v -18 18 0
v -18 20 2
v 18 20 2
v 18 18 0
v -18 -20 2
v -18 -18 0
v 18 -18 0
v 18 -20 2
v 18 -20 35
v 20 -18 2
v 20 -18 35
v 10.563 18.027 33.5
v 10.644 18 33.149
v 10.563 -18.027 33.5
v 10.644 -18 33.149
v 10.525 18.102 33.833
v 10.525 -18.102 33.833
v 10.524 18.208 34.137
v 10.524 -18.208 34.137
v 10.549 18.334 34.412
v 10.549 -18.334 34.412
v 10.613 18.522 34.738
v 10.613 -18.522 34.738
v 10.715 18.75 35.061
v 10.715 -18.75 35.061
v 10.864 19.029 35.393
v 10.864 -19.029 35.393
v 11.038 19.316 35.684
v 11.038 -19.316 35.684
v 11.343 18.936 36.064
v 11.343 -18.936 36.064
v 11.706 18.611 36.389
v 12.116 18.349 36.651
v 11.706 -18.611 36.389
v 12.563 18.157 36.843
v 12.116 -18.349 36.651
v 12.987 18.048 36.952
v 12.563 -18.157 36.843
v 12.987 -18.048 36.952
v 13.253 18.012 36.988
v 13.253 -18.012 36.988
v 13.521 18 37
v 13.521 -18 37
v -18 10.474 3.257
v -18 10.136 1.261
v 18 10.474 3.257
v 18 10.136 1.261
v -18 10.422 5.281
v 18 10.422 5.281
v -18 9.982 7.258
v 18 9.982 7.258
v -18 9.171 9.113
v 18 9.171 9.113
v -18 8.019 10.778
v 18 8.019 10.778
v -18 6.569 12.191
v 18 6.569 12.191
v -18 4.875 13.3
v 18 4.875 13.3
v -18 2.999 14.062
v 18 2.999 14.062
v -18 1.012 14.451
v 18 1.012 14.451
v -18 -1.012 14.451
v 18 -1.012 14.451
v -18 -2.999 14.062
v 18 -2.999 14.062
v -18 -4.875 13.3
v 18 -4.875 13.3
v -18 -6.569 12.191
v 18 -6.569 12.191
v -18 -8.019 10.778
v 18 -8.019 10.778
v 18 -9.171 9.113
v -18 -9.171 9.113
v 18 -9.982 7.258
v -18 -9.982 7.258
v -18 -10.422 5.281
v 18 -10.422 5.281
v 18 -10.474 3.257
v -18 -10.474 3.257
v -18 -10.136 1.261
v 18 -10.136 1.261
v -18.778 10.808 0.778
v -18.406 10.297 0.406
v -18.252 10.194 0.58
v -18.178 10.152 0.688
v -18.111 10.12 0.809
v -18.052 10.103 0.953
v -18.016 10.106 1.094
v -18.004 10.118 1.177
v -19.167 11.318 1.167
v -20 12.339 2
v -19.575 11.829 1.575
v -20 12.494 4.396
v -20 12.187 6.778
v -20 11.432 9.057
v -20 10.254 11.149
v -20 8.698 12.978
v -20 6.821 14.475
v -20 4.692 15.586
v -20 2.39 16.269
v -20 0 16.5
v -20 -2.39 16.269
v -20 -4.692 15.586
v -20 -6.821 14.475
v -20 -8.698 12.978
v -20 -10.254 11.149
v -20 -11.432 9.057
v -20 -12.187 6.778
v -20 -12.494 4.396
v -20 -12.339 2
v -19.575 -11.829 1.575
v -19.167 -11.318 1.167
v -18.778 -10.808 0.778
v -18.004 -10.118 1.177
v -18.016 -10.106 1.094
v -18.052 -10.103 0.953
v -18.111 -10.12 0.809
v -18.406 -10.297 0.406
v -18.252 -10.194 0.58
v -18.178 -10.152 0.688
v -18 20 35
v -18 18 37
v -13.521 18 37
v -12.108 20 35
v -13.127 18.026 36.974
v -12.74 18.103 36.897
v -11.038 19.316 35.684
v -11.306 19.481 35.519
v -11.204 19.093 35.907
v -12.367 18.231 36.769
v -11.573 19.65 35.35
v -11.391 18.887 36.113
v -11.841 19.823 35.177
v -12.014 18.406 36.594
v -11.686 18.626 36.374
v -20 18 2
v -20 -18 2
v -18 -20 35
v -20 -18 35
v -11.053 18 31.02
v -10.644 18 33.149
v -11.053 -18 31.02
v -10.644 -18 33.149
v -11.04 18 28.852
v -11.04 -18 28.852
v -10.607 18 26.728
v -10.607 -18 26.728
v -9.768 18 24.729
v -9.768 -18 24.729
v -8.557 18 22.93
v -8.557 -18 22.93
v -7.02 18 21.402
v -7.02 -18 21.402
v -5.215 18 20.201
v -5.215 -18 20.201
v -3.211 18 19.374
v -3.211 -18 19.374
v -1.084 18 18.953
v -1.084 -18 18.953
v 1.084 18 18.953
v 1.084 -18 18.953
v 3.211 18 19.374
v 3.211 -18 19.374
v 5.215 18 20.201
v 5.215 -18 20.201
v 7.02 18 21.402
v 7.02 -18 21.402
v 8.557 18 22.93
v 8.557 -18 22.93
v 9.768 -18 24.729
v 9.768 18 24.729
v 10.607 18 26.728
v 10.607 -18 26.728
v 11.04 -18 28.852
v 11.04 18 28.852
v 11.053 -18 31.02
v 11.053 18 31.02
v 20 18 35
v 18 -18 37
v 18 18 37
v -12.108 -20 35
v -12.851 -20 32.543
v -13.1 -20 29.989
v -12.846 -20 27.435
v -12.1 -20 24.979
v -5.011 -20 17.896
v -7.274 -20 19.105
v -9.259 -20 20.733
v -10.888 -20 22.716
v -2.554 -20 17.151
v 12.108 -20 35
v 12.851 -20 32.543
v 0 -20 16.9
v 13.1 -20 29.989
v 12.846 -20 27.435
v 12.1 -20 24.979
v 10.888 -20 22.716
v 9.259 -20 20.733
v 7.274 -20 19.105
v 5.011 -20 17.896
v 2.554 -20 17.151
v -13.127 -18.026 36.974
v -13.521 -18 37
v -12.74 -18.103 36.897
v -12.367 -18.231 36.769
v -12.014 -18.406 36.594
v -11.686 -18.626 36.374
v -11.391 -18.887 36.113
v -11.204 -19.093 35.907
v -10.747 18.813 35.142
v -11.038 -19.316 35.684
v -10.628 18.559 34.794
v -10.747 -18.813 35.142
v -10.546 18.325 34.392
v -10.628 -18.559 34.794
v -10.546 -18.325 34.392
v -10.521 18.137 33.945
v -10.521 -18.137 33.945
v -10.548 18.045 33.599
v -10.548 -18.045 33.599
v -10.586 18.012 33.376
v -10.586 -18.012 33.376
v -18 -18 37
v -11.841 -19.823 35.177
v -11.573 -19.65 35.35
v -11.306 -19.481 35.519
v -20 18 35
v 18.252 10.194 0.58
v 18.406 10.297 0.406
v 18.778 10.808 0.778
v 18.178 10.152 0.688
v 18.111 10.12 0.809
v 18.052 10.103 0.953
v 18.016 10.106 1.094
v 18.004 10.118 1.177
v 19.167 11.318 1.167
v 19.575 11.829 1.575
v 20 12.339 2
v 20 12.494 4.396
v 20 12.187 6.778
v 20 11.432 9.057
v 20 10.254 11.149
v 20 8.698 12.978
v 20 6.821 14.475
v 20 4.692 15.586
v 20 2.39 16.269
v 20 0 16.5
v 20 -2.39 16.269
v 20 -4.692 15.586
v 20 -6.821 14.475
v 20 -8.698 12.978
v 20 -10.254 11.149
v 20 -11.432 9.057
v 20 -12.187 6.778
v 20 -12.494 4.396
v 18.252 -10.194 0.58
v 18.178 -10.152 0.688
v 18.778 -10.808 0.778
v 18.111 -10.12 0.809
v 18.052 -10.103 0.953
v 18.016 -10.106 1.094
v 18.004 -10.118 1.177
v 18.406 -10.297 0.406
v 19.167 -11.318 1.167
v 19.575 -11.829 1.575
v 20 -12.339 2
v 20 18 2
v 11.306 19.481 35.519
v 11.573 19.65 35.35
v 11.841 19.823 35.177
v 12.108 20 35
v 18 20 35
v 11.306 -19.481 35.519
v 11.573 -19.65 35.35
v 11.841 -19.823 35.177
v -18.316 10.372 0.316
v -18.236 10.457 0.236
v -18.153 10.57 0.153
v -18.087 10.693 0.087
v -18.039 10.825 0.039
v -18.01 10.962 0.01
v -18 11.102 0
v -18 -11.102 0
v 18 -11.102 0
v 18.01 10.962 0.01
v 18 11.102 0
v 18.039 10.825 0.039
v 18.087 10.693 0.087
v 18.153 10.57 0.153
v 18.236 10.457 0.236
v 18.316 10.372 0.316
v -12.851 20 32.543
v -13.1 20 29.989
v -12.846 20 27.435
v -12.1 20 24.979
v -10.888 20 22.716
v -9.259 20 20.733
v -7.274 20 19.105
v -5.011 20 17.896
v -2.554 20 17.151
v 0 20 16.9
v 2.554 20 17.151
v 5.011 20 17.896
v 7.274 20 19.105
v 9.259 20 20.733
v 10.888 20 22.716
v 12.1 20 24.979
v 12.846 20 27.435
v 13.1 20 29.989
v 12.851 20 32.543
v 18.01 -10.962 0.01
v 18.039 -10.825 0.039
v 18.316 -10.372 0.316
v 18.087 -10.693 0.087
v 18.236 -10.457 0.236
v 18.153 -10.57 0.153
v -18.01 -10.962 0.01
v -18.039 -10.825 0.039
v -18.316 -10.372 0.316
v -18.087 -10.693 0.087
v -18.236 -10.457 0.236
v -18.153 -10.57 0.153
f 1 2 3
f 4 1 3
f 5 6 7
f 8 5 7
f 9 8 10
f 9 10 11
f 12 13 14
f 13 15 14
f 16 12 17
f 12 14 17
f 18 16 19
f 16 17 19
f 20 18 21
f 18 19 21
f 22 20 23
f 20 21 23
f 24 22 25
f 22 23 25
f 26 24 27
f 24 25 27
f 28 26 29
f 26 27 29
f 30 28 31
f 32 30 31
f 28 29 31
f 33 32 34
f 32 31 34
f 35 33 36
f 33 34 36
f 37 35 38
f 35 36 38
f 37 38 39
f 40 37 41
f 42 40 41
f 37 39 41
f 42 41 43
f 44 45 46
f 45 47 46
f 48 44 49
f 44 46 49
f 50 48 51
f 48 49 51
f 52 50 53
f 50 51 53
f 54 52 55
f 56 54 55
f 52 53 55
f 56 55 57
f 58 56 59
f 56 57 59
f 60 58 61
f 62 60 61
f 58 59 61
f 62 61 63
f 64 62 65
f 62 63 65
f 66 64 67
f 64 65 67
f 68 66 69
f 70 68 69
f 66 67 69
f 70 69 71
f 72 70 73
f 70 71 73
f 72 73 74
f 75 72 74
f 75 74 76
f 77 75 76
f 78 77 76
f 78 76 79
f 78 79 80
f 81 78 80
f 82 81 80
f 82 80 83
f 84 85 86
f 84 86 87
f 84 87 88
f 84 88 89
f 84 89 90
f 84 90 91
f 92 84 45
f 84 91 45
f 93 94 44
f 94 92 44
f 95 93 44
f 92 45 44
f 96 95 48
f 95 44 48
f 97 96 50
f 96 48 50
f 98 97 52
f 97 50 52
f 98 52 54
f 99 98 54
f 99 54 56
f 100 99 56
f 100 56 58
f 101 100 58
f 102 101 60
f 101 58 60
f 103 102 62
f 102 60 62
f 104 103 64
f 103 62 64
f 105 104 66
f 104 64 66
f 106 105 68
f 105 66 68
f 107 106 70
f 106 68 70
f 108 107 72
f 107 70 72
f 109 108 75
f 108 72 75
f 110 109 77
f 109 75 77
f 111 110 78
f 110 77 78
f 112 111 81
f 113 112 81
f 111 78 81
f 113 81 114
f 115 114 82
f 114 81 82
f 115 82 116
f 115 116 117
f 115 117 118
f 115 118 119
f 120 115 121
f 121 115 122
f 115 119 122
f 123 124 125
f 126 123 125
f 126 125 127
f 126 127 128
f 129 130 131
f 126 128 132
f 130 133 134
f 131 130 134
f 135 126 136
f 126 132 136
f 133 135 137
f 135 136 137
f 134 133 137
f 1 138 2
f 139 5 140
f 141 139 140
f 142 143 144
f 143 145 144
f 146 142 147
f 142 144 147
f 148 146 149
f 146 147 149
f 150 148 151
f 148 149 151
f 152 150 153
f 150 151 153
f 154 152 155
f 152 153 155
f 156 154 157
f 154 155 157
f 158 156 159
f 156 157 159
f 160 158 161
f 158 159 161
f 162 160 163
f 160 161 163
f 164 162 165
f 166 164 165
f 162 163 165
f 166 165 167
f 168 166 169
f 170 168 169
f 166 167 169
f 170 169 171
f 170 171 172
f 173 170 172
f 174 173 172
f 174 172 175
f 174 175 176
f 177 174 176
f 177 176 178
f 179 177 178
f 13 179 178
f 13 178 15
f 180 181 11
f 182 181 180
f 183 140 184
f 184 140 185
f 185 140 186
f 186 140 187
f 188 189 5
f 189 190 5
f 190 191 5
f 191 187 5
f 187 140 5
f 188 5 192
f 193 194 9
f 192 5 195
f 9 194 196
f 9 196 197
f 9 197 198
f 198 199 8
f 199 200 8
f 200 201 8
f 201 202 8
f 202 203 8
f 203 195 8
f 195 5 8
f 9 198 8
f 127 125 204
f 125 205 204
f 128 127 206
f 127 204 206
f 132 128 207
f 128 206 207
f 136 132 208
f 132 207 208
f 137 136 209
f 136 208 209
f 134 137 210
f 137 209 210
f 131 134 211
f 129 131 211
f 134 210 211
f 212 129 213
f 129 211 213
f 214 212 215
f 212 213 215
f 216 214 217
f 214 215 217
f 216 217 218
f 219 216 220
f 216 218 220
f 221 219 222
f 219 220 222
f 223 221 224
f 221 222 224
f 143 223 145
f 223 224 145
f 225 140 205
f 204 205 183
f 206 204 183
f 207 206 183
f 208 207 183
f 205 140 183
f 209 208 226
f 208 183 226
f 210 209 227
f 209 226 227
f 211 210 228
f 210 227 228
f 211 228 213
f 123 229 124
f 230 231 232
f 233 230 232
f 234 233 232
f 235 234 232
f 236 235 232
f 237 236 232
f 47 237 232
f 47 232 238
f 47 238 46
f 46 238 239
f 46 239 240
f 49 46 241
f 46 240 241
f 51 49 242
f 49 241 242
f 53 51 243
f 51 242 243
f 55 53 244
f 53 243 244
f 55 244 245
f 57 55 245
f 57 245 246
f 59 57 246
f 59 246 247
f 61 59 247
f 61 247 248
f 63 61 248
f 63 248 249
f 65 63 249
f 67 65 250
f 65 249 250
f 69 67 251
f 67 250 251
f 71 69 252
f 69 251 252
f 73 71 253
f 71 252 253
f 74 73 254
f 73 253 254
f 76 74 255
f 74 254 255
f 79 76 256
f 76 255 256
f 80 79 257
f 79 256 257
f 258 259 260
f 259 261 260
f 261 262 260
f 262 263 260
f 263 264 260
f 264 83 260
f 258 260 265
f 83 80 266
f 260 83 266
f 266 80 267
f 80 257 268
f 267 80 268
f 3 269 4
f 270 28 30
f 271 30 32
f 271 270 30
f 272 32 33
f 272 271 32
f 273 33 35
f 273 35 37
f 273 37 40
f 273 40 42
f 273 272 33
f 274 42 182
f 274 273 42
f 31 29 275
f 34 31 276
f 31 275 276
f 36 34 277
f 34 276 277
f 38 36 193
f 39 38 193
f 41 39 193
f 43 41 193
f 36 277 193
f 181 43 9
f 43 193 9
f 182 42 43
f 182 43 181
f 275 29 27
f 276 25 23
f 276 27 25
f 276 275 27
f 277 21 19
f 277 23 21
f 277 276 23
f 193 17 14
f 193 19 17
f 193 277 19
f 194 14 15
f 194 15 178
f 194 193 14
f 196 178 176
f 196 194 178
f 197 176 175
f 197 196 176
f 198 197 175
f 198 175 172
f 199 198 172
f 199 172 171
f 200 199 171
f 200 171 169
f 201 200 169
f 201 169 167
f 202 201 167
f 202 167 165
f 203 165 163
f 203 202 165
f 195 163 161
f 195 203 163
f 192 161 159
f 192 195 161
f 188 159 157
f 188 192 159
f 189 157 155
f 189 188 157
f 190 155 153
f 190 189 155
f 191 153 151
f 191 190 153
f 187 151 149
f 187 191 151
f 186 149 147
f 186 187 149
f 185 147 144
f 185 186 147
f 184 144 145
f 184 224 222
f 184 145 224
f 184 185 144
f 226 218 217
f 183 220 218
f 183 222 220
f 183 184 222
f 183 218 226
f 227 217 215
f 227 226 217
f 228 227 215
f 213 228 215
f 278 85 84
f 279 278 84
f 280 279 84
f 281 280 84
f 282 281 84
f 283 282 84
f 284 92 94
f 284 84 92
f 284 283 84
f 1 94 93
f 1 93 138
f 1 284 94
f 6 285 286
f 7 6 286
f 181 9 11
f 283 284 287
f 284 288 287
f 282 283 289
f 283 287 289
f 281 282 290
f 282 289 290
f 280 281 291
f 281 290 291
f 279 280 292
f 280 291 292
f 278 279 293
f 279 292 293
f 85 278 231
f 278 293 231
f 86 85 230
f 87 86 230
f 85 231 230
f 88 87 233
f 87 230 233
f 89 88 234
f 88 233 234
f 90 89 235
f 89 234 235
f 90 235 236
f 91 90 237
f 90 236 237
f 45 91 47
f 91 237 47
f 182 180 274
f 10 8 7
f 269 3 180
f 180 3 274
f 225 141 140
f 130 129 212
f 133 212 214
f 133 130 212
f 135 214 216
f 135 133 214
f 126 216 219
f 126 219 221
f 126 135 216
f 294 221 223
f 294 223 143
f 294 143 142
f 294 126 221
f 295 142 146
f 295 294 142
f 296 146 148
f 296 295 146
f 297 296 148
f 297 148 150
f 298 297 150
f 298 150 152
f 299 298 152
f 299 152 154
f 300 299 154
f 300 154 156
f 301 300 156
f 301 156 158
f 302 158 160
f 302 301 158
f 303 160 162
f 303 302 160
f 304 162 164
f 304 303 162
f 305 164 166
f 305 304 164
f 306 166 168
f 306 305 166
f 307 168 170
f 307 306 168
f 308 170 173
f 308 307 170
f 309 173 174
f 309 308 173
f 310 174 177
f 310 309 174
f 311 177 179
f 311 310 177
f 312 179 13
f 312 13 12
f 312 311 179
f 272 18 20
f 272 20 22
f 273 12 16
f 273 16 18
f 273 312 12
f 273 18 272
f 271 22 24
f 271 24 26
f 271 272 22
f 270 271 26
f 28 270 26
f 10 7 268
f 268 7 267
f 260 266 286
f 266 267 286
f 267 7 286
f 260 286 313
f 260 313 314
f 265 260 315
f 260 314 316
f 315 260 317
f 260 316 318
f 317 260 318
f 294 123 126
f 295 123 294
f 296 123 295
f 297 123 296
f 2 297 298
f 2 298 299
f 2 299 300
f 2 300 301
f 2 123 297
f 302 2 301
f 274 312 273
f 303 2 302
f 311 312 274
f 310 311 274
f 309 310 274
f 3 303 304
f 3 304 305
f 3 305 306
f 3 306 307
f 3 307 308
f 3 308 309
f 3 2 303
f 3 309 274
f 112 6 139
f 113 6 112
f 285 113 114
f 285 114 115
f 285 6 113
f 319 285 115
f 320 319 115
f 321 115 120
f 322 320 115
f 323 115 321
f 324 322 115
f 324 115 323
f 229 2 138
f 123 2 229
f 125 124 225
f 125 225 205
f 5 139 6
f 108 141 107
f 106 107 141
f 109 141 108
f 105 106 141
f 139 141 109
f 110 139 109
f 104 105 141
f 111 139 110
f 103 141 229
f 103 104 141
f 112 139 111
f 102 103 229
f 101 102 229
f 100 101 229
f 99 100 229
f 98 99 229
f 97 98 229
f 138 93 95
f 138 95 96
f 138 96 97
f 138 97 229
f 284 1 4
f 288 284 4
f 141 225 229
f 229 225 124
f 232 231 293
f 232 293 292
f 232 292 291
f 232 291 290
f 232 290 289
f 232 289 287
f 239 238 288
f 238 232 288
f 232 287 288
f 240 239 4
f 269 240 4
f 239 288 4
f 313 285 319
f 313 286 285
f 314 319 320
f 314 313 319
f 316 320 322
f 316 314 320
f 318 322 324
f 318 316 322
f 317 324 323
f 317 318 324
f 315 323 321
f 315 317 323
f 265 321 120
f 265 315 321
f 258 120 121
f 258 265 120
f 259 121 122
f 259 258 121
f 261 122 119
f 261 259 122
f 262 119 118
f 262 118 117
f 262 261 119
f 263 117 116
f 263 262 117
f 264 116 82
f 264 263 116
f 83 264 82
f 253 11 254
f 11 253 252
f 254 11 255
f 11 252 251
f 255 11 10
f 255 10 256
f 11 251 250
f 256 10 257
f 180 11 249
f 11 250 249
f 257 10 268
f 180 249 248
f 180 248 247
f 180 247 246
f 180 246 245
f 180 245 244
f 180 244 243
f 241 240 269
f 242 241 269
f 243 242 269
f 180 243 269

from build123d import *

# Parameters (mm, degrees)
SKETCH_W        = 40
SKETCH_H        = 40
PAD_DEPTH       = 37
SKETCH001_R     = 10.5
POCKET_DEPTH    = 40.001
SKETCH002_R     = 11.1
POCKET001_DEPTH = 40.001
CHAMFER_SIZE    = 2
FILLET_R        = 3
FILLET001_R     = 1


with BuildPart() as part:
    # Sketch → Pad (new body)
    with BuildSketch(Plane.XY):
        Rectangle(SKETCH_W, SKETCH_H)
    extrude(amount=PAD_DEPTH)

    # Sketch001 → Pocket (cut, through all)
    with BuildSketch(Plane.YZ.offset(20)):
        with Locations((0, 4)):
            Circle(SKETCH001_R)
    extrude(amount=-POCKET_DEPTH, mode=Mode.SUBTRACT)

    # Sketch002 → Pocket001 (cut, through all)
    with BuildSketch(Plane.XZ.offset(20)):
        with Locations((0, 30)):
            Circle(SKETCH002_R)
    extrude(amount=-POCKET001_DEPTH, mode=Mode.SUBTRACT)

    # Chamfer
    chamfer_edges = [part.edges().sort_by_distance(p)[0] for p in [
        (-20, -14.854122, 0),
        (-20, -2.038803, 14.300159),
        (-20, 10.300159, 1.961197),
        (-20, 14.854122, 0),
        (-20, 20, 18.5),
        (-20, 0, 37),
        (-20, -20, 18.5),
        (0, -20, 0),
        (-14.307261, -20, 37),
        (-3.714081, -20, 19.539809),
        (10.460191, -20, 33.714081),
        (14.307261, -20, 37),
        (20, -20, 18.5),
        (20, 14.854122, 0),
        (20, 10.300159, 1.961197),
        (20, -2.038803, 14.300159),
        (20, -14.854122, 0),
        (20, 0, 37),
        (20, 20, 18.5),
        (0, 20, 0),
        (14.307261, 20, 37),
        (10.460191, 20, 33.714081),
        (-3.714081, 20, 19.539809),
        (-14.307261, 20, 37),
    ]]
    chamfer(chamfer_edges, length=CHAMFER_SIZE)

    # Fillet
    fillet_edges = [part.edges().sort_by_distance(p)[0] for p in [
        (-8.614523, 0, 37),
        (8.614523, 0, 37),
    ]]
    fillet(fillet_edges, radius=FILLET_R)

    # Fillet001
    fillet001_edges = [part.edges().sort_by_distance(p)[0] for p in [
        (0, 9.708244, 0),
        (0, -9.708244, 0),
    ]]
    fillet(fillet001_edges, radius=FILLET001_R)


solid = part.part
